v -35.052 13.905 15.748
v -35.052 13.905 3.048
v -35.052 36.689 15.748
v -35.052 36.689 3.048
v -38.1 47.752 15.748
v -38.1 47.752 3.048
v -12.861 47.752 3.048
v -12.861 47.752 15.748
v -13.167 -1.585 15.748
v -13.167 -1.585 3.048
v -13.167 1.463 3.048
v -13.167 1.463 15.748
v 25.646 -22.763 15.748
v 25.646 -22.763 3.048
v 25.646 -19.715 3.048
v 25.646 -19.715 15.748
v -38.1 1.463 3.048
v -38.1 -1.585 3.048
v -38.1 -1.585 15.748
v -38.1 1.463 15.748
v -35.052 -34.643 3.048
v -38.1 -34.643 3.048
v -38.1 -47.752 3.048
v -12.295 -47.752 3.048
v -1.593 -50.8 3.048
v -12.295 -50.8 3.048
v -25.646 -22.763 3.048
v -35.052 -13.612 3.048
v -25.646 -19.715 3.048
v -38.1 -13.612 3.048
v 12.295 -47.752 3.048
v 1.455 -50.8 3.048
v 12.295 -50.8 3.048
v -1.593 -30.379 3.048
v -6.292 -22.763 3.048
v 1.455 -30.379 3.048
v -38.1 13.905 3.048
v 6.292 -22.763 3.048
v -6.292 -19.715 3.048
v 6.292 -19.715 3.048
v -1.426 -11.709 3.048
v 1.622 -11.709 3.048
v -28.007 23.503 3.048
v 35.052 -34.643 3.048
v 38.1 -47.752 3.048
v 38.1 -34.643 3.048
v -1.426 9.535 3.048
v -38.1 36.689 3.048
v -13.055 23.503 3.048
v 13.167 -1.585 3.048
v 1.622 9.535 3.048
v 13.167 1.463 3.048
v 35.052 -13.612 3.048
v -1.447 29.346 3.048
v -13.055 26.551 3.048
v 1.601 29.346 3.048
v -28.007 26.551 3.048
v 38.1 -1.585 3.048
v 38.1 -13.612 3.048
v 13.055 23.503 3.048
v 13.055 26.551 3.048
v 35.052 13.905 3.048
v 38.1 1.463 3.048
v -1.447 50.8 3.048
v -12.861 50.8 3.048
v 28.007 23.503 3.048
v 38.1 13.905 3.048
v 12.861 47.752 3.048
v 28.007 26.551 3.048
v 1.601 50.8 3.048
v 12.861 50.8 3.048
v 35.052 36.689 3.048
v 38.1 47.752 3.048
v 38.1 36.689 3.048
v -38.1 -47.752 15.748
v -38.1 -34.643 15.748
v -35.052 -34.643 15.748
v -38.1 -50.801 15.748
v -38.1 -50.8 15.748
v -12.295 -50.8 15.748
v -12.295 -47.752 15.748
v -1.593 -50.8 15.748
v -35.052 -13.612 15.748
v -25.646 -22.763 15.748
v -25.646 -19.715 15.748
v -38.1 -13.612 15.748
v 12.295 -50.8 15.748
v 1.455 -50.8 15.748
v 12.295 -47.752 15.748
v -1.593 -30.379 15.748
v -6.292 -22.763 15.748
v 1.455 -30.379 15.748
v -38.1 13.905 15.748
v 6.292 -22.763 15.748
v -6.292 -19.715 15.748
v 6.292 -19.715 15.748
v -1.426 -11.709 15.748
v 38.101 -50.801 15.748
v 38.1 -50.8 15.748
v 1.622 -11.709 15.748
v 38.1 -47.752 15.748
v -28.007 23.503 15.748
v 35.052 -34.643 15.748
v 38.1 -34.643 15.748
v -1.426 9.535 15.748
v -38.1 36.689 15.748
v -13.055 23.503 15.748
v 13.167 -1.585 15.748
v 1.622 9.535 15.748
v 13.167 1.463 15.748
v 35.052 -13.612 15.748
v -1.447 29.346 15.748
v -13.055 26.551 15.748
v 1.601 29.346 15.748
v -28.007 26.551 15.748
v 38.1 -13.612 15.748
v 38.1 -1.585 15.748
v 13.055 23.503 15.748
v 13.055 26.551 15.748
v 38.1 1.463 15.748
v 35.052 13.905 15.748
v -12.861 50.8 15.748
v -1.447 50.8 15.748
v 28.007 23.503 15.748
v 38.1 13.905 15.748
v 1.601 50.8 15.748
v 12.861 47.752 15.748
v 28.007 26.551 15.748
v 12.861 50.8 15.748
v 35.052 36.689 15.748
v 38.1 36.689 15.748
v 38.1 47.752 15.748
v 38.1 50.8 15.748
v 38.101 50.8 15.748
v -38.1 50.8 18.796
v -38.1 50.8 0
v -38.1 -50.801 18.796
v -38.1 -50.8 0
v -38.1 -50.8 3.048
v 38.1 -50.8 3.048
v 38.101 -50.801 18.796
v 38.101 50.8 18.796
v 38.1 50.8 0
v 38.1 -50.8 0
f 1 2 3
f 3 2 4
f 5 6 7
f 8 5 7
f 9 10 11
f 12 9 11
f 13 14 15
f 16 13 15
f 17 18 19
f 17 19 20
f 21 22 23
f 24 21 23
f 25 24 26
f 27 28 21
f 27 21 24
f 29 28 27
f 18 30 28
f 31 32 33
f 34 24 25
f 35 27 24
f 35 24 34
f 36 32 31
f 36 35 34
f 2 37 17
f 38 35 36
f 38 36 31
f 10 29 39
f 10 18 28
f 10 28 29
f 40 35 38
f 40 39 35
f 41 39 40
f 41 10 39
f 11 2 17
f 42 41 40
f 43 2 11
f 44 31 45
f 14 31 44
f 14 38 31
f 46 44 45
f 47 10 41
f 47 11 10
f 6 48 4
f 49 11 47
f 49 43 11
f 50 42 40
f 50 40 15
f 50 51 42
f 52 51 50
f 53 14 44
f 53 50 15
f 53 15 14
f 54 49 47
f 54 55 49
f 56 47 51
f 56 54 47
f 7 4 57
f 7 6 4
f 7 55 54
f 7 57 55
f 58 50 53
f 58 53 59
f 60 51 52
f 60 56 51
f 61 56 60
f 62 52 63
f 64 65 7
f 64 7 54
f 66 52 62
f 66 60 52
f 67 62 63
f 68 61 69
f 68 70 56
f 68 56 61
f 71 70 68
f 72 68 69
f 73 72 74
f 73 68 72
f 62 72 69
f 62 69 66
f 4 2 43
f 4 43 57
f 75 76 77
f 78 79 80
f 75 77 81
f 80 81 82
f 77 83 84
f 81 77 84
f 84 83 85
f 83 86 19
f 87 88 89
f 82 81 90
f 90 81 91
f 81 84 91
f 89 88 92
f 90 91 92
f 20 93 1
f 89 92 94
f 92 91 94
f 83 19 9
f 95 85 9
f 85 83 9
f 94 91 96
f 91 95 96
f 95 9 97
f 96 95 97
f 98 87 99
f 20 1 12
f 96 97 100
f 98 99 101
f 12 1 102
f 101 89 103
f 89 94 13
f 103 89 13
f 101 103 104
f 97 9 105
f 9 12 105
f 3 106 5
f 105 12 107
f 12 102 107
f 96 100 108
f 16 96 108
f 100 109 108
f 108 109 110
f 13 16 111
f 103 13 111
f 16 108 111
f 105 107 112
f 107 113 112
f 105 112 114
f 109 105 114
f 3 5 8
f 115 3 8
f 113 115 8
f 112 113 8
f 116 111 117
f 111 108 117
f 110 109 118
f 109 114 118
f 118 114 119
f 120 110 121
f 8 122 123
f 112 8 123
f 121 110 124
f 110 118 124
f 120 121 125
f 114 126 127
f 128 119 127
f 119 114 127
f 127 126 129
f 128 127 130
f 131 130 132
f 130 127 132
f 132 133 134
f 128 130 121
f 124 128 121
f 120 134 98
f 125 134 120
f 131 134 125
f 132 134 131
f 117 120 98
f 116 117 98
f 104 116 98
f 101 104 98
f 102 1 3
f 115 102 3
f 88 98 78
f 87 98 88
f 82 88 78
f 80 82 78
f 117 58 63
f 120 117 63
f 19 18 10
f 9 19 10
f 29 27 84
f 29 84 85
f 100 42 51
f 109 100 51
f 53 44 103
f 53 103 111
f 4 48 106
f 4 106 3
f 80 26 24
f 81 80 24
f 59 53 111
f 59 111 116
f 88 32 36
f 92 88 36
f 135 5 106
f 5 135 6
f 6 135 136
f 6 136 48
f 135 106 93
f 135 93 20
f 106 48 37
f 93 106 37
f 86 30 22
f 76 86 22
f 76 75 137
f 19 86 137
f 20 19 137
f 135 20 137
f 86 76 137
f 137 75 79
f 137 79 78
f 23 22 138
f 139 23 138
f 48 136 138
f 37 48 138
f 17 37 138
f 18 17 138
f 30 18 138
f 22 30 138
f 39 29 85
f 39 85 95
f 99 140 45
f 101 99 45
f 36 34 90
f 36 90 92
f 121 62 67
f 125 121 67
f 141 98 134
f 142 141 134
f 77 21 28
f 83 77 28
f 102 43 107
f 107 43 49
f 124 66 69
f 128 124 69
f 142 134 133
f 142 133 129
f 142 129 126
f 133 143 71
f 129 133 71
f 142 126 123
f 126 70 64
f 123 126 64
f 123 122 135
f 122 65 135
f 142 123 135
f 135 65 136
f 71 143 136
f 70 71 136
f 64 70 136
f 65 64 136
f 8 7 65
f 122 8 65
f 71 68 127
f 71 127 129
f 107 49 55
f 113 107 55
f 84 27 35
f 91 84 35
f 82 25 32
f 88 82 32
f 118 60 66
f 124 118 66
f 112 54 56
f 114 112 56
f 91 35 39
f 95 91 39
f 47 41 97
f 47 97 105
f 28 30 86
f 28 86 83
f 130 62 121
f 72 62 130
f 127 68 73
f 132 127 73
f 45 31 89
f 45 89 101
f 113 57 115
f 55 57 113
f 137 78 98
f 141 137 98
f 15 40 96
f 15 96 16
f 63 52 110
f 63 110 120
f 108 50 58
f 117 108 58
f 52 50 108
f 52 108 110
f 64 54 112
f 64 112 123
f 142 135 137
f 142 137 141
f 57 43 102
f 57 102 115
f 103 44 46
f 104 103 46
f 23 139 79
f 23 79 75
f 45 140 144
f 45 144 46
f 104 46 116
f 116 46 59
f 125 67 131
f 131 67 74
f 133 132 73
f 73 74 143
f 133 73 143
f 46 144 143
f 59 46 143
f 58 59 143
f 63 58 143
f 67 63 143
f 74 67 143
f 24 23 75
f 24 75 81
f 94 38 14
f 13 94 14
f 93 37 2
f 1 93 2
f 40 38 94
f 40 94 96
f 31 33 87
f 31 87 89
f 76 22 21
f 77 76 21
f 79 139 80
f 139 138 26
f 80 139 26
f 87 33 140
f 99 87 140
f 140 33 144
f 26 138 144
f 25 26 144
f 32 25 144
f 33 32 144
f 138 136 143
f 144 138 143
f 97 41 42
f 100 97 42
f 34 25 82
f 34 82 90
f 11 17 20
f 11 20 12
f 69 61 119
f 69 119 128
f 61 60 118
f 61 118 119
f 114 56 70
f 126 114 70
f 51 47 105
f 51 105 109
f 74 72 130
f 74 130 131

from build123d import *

# Parameters (mm, degrees)
F0_W     = 76.2
F0_H     = 101.6
F1_DEPTH = 3.048
F2_W     = 25.238578
F2_H     = 3.048
F2_W_2   = 3.048
F2_H_2   = 21.454054
F2_W_3   = 14.951317
F2_H_3   = 22.784396
F2_W_4   = 24.933161
F2_H_4   = 21.244367
F2_H_5   = 21.031751
F2_W_5   = 19.353797
F2_H_6   = 20.421157
F2_W_6   = 25.804729
F3_DEPTH = 12.7
F4_W     = 25.238578
F4_H     = 3.048
F5_DEPTH = 3.048


with BuildPart() as f1:
    # F0 (on Top) → F1 (new body)
    with BuildSketch(Plane.XY):
        Rectangle(F0_W, F0_H)
    extrude(amount=F1_DEPTH)

    # F2 (on face) → F3 (join)
    with BuildSketch(Plane.XY.offset(3.048)):
        with Locations((-25.480711, 49.276)):
            Rectangle(F2_W, F2_H)
        with Locations((25.480711, 49.276)):
            Rectangle(F2_W, F2_H)
        with Locations((0.076681, 40.072973)):
            Rectangle(F2_W_2, F2_H_2)
        with Locations((-20.530921, 25.026575)):
            Rectangle(F2_W_3, F2_H)
        with Locations((-36.576, 25.297143)):
            Rectangle(F2_W_2, F2_H_3)
        with Locations((20.530921, 25.026575)):
            Rectangle(F2_W_3, F2_H)
        with Locations((36.576, 25.297143)):
            Rectangle(F2_W_2, F2_H_3)
        with Locations((25.63342, -0.061376)):
            Rectangle(F2_W_4, F2_H)
        with Locations((0.098287, -1.087287)):
            Rectangle(F2_W_2, F2_H_4)
        with Locations((-25.63342, -0.061376)):
            Rectangle(F2_W_4, F2_H)
        with Locations((-36.576, -24.127469)):
            Rectangle(F2_W_2, F2_H_5)
        with Locations((-15.968946, -21.239439)):
            Rectangle(F2_W_5, F2_H)
        with Locations((15.968946, -21.239439)):
            Rectangle(F2_W_5, F2_H)
        with Locations((36.576, -24.127469)):
            Rectangle(F2_W_2, F2_H_5)
        with Locations((-0.069343, -40.589422)):
            Rectangle(F2_W_2, F2_H_6)
        with Locations((-25.197636, -49.276)):
            Rectangle(F2_W_6, F2_H)
        with Locations((25.197636, -49.276)):
            Rectangle(F2_W_6, F2_H)
    extrude(amount=F3_DEPTH)

    # F4 (on face) → F5 (join)
    with BuildSketch(Plane.XY.offset(15.748)):
        Polygon((38.100678, 50.8), (-12.861422, 50.8), (-12.861422, 47.752), (-38.1, 47.752), (-38.1, -50.800964), (38.100678, -50.800964), align=None)
        with Locations((-25.480711, 49.276)):
            Rectangle(F4_W, F4_H)
    extrude(amount=F5_DEPTH)


solid = f1.part
